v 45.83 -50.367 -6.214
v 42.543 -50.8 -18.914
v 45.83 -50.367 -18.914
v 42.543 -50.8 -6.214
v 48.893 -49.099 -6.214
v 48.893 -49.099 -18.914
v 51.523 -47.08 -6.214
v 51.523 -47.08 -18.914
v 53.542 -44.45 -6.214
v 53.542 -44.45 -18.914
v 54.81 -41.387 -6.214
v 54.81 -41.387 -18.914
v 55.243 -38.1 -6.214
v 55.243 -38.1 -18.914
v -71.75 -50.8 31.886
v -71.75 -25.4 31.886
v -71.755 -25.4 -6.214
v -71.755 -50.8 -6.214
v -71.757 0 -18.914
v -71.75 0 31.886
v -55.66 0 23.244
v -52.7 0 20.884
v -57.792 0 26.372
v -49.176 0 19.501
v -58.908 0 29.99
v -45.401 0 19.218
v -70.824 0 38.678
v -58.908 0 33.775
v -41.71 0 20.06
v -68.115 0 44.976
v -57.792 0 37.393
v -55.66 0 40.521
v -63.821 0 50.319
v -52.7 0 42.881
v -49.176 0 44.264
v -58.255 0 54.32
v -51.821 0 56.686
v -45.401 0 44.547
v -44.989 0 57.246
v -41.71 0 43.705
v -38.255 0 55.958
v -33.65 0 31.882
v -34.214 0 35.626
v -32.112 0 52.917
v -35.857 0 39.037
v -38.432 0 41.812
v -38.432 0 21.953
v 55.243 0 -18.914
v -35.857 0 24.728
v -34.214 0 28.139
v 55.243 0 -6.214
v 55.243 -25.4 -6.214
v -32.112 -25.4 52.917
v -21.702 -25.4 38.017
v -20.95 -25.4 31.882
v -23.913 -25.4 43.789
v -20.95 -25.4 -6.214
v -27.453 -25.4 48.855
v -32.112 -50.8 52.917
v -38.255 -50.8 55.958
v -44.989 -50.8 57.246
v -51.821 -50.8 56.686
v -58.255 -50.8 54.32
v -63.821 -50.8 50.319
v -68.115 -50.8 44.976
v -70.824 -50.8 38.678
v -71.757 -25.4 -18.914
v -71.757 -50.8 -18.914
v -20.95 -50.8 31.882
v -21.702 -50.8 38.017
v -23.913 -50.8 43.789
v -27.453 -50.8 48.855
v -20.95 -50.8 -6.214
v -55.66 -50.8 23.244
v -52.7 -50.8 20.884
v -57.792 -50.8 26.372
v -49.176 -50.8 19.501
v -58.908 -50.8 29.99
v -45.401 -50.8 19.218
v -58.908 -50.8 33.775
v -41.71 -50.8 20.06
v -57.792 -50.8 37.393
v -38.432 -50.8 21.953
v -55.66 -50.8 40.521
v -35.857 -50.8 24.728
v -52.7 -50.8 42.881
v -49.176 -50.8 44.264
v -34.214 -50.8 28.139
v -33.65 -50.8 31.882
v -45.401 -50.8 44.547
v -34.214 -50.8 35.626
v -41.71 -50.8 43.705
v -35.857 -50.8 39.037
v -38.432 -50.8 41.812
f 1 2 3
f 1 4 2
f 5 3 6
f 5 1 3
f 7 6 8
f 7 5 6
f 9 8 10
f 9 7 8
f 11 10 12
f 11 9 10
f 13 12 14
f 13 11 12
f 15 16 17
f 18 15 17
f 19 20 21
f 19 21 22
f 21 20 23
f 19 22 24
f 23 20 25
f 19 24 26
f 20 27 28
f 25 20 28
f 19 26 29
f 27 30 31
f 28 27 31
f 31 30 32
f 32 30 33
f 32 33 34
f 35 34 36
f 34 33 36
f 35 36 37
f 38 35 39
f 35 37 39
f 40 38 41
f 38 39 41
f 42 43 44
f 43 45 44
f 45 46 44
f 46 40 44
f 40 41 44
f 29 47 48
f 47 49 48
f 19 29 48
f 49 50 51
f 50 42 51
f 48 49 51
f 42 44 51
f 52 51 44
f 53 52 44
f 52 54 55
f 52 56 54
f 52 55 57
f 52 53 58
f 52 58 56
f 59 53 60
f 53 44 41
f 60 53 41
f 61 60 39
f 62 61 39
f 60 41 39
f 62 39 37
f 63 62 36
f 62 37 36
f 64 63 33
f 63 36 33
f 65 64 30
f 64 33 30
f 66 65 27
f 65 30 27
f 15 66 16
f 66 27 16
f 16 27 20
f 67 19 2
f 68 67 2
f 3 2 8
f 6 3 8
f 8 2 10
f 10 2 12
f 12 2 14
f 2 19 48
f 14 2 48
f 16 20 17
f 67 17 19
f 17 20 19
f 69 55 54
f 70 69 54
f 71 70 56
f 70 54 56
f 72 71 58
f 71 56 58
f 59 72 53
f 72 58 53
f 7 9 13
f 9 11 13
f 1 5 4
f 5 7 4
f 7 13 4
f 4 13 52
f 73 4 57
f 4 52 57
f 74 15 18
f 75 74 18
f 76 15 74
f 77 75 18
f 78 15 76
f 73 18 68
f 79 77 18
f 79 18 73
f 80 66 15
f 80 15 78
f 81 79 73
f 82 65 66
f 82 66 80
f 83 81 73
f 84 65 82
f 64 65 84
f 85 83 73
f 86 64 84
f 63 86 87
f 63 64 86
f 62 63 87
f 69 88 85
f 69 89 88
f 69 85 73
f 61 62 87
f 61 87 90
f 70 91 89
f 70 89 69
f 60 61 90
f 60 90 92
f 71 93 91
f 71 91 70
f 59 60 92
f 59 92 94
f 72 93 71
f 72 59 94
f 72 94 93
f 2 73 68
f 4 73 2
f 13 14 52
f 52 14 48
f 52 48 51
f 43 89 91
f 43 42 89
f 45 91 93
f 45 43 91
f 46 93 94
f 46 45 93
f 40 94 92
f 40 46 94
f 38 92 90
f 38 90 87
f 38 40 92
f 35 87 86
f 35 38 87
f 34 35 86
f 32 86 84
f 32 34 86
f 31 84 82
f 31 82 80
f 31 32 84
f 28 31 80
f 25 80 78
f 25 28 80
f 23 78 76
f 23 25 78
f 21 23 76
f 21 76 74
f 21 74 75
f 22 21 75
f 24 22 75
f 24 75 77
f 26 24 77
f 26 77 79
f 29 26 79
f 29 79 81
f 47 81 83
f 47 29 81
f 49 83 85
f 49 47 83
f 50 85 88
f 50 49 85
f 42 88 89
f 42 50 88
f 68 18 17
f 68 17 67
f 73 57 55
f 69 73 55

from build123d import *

# Parameters (mm, degrees)
F0_R     = 12.7
F1_DEPTH = 25.4
F2_R     = 12.7
F3_DEPTH = 25.4
F4_R     = 12.7


with BuildPart() as f1:
    # F0 (on Front) → F1 (new body)
    with BuildSketch(Plane.XZ):
        with BuildLine():
            Line((55.243076, -6.21413), (-32.111921, 52.916597))
            ThreePointArc((-32.111921, 52.916597), (-58.254618, 54.319874), (-71.749997, 31.88587))
            Line((-71.749997, 31.88587), (-71.756924, -18.91413))
            Line((-71.756924, -18.91413), (55.243076, -18.91413))
            Line((55.243076, -18.91413), (55.243076, -6.21413))
        make_face()
        with Locations((-46.349997, 31.882406)):
            Circle(F0_R, mode=Mode.SUBTRACT)
    extrude(amount=F1_DEPTH)

    # F2 (on face) → F3 (join)
    with BuildSketch(Plane.XZ.offset(25.4)):
        with BuildLine():
            Line((-20.949997, -6.21413), (-20.949997, 31.882406))
            ThreePointArc((-20.949997, 31.882406), (-23.91334, 43.788557), (-32.111921, 52.916597))
            ThreePointArc((-32.111921, 52.916597), (-58.254618, 54.319874), (-71.749997, 31.88587))
            Line((-71.749997, 31.88587), (-71.755192, -6.21413))
            Line((-71.755192, -6.21413), (-71.756058, -12.56413))
            Line((-71.756058, -12.56413), (-71.756924, -18.91413))
            Line((-71.756924, -18.91413), (55.243076, -18.91413))
            Line((55.243076, -18.91413), (55.243076, -6.21413))
            Line((55.243076, -6.21413), (-20.949997, -6.21413))
        make_face()
        with Locations((-46.349997, 31.882406)):
            Circle(F2_R, mode=Mode.SUBTRACT)
    extrude(amount=F3_DEPTH)

    # F4
    f4_edges = [f1.edges().sort_by_distance(p)[0] for p in [
        (55.243076, -50.8, -12.56413),
    ]]
    fillet(f4_edges, radius=F4_R)


solid = f1.part
